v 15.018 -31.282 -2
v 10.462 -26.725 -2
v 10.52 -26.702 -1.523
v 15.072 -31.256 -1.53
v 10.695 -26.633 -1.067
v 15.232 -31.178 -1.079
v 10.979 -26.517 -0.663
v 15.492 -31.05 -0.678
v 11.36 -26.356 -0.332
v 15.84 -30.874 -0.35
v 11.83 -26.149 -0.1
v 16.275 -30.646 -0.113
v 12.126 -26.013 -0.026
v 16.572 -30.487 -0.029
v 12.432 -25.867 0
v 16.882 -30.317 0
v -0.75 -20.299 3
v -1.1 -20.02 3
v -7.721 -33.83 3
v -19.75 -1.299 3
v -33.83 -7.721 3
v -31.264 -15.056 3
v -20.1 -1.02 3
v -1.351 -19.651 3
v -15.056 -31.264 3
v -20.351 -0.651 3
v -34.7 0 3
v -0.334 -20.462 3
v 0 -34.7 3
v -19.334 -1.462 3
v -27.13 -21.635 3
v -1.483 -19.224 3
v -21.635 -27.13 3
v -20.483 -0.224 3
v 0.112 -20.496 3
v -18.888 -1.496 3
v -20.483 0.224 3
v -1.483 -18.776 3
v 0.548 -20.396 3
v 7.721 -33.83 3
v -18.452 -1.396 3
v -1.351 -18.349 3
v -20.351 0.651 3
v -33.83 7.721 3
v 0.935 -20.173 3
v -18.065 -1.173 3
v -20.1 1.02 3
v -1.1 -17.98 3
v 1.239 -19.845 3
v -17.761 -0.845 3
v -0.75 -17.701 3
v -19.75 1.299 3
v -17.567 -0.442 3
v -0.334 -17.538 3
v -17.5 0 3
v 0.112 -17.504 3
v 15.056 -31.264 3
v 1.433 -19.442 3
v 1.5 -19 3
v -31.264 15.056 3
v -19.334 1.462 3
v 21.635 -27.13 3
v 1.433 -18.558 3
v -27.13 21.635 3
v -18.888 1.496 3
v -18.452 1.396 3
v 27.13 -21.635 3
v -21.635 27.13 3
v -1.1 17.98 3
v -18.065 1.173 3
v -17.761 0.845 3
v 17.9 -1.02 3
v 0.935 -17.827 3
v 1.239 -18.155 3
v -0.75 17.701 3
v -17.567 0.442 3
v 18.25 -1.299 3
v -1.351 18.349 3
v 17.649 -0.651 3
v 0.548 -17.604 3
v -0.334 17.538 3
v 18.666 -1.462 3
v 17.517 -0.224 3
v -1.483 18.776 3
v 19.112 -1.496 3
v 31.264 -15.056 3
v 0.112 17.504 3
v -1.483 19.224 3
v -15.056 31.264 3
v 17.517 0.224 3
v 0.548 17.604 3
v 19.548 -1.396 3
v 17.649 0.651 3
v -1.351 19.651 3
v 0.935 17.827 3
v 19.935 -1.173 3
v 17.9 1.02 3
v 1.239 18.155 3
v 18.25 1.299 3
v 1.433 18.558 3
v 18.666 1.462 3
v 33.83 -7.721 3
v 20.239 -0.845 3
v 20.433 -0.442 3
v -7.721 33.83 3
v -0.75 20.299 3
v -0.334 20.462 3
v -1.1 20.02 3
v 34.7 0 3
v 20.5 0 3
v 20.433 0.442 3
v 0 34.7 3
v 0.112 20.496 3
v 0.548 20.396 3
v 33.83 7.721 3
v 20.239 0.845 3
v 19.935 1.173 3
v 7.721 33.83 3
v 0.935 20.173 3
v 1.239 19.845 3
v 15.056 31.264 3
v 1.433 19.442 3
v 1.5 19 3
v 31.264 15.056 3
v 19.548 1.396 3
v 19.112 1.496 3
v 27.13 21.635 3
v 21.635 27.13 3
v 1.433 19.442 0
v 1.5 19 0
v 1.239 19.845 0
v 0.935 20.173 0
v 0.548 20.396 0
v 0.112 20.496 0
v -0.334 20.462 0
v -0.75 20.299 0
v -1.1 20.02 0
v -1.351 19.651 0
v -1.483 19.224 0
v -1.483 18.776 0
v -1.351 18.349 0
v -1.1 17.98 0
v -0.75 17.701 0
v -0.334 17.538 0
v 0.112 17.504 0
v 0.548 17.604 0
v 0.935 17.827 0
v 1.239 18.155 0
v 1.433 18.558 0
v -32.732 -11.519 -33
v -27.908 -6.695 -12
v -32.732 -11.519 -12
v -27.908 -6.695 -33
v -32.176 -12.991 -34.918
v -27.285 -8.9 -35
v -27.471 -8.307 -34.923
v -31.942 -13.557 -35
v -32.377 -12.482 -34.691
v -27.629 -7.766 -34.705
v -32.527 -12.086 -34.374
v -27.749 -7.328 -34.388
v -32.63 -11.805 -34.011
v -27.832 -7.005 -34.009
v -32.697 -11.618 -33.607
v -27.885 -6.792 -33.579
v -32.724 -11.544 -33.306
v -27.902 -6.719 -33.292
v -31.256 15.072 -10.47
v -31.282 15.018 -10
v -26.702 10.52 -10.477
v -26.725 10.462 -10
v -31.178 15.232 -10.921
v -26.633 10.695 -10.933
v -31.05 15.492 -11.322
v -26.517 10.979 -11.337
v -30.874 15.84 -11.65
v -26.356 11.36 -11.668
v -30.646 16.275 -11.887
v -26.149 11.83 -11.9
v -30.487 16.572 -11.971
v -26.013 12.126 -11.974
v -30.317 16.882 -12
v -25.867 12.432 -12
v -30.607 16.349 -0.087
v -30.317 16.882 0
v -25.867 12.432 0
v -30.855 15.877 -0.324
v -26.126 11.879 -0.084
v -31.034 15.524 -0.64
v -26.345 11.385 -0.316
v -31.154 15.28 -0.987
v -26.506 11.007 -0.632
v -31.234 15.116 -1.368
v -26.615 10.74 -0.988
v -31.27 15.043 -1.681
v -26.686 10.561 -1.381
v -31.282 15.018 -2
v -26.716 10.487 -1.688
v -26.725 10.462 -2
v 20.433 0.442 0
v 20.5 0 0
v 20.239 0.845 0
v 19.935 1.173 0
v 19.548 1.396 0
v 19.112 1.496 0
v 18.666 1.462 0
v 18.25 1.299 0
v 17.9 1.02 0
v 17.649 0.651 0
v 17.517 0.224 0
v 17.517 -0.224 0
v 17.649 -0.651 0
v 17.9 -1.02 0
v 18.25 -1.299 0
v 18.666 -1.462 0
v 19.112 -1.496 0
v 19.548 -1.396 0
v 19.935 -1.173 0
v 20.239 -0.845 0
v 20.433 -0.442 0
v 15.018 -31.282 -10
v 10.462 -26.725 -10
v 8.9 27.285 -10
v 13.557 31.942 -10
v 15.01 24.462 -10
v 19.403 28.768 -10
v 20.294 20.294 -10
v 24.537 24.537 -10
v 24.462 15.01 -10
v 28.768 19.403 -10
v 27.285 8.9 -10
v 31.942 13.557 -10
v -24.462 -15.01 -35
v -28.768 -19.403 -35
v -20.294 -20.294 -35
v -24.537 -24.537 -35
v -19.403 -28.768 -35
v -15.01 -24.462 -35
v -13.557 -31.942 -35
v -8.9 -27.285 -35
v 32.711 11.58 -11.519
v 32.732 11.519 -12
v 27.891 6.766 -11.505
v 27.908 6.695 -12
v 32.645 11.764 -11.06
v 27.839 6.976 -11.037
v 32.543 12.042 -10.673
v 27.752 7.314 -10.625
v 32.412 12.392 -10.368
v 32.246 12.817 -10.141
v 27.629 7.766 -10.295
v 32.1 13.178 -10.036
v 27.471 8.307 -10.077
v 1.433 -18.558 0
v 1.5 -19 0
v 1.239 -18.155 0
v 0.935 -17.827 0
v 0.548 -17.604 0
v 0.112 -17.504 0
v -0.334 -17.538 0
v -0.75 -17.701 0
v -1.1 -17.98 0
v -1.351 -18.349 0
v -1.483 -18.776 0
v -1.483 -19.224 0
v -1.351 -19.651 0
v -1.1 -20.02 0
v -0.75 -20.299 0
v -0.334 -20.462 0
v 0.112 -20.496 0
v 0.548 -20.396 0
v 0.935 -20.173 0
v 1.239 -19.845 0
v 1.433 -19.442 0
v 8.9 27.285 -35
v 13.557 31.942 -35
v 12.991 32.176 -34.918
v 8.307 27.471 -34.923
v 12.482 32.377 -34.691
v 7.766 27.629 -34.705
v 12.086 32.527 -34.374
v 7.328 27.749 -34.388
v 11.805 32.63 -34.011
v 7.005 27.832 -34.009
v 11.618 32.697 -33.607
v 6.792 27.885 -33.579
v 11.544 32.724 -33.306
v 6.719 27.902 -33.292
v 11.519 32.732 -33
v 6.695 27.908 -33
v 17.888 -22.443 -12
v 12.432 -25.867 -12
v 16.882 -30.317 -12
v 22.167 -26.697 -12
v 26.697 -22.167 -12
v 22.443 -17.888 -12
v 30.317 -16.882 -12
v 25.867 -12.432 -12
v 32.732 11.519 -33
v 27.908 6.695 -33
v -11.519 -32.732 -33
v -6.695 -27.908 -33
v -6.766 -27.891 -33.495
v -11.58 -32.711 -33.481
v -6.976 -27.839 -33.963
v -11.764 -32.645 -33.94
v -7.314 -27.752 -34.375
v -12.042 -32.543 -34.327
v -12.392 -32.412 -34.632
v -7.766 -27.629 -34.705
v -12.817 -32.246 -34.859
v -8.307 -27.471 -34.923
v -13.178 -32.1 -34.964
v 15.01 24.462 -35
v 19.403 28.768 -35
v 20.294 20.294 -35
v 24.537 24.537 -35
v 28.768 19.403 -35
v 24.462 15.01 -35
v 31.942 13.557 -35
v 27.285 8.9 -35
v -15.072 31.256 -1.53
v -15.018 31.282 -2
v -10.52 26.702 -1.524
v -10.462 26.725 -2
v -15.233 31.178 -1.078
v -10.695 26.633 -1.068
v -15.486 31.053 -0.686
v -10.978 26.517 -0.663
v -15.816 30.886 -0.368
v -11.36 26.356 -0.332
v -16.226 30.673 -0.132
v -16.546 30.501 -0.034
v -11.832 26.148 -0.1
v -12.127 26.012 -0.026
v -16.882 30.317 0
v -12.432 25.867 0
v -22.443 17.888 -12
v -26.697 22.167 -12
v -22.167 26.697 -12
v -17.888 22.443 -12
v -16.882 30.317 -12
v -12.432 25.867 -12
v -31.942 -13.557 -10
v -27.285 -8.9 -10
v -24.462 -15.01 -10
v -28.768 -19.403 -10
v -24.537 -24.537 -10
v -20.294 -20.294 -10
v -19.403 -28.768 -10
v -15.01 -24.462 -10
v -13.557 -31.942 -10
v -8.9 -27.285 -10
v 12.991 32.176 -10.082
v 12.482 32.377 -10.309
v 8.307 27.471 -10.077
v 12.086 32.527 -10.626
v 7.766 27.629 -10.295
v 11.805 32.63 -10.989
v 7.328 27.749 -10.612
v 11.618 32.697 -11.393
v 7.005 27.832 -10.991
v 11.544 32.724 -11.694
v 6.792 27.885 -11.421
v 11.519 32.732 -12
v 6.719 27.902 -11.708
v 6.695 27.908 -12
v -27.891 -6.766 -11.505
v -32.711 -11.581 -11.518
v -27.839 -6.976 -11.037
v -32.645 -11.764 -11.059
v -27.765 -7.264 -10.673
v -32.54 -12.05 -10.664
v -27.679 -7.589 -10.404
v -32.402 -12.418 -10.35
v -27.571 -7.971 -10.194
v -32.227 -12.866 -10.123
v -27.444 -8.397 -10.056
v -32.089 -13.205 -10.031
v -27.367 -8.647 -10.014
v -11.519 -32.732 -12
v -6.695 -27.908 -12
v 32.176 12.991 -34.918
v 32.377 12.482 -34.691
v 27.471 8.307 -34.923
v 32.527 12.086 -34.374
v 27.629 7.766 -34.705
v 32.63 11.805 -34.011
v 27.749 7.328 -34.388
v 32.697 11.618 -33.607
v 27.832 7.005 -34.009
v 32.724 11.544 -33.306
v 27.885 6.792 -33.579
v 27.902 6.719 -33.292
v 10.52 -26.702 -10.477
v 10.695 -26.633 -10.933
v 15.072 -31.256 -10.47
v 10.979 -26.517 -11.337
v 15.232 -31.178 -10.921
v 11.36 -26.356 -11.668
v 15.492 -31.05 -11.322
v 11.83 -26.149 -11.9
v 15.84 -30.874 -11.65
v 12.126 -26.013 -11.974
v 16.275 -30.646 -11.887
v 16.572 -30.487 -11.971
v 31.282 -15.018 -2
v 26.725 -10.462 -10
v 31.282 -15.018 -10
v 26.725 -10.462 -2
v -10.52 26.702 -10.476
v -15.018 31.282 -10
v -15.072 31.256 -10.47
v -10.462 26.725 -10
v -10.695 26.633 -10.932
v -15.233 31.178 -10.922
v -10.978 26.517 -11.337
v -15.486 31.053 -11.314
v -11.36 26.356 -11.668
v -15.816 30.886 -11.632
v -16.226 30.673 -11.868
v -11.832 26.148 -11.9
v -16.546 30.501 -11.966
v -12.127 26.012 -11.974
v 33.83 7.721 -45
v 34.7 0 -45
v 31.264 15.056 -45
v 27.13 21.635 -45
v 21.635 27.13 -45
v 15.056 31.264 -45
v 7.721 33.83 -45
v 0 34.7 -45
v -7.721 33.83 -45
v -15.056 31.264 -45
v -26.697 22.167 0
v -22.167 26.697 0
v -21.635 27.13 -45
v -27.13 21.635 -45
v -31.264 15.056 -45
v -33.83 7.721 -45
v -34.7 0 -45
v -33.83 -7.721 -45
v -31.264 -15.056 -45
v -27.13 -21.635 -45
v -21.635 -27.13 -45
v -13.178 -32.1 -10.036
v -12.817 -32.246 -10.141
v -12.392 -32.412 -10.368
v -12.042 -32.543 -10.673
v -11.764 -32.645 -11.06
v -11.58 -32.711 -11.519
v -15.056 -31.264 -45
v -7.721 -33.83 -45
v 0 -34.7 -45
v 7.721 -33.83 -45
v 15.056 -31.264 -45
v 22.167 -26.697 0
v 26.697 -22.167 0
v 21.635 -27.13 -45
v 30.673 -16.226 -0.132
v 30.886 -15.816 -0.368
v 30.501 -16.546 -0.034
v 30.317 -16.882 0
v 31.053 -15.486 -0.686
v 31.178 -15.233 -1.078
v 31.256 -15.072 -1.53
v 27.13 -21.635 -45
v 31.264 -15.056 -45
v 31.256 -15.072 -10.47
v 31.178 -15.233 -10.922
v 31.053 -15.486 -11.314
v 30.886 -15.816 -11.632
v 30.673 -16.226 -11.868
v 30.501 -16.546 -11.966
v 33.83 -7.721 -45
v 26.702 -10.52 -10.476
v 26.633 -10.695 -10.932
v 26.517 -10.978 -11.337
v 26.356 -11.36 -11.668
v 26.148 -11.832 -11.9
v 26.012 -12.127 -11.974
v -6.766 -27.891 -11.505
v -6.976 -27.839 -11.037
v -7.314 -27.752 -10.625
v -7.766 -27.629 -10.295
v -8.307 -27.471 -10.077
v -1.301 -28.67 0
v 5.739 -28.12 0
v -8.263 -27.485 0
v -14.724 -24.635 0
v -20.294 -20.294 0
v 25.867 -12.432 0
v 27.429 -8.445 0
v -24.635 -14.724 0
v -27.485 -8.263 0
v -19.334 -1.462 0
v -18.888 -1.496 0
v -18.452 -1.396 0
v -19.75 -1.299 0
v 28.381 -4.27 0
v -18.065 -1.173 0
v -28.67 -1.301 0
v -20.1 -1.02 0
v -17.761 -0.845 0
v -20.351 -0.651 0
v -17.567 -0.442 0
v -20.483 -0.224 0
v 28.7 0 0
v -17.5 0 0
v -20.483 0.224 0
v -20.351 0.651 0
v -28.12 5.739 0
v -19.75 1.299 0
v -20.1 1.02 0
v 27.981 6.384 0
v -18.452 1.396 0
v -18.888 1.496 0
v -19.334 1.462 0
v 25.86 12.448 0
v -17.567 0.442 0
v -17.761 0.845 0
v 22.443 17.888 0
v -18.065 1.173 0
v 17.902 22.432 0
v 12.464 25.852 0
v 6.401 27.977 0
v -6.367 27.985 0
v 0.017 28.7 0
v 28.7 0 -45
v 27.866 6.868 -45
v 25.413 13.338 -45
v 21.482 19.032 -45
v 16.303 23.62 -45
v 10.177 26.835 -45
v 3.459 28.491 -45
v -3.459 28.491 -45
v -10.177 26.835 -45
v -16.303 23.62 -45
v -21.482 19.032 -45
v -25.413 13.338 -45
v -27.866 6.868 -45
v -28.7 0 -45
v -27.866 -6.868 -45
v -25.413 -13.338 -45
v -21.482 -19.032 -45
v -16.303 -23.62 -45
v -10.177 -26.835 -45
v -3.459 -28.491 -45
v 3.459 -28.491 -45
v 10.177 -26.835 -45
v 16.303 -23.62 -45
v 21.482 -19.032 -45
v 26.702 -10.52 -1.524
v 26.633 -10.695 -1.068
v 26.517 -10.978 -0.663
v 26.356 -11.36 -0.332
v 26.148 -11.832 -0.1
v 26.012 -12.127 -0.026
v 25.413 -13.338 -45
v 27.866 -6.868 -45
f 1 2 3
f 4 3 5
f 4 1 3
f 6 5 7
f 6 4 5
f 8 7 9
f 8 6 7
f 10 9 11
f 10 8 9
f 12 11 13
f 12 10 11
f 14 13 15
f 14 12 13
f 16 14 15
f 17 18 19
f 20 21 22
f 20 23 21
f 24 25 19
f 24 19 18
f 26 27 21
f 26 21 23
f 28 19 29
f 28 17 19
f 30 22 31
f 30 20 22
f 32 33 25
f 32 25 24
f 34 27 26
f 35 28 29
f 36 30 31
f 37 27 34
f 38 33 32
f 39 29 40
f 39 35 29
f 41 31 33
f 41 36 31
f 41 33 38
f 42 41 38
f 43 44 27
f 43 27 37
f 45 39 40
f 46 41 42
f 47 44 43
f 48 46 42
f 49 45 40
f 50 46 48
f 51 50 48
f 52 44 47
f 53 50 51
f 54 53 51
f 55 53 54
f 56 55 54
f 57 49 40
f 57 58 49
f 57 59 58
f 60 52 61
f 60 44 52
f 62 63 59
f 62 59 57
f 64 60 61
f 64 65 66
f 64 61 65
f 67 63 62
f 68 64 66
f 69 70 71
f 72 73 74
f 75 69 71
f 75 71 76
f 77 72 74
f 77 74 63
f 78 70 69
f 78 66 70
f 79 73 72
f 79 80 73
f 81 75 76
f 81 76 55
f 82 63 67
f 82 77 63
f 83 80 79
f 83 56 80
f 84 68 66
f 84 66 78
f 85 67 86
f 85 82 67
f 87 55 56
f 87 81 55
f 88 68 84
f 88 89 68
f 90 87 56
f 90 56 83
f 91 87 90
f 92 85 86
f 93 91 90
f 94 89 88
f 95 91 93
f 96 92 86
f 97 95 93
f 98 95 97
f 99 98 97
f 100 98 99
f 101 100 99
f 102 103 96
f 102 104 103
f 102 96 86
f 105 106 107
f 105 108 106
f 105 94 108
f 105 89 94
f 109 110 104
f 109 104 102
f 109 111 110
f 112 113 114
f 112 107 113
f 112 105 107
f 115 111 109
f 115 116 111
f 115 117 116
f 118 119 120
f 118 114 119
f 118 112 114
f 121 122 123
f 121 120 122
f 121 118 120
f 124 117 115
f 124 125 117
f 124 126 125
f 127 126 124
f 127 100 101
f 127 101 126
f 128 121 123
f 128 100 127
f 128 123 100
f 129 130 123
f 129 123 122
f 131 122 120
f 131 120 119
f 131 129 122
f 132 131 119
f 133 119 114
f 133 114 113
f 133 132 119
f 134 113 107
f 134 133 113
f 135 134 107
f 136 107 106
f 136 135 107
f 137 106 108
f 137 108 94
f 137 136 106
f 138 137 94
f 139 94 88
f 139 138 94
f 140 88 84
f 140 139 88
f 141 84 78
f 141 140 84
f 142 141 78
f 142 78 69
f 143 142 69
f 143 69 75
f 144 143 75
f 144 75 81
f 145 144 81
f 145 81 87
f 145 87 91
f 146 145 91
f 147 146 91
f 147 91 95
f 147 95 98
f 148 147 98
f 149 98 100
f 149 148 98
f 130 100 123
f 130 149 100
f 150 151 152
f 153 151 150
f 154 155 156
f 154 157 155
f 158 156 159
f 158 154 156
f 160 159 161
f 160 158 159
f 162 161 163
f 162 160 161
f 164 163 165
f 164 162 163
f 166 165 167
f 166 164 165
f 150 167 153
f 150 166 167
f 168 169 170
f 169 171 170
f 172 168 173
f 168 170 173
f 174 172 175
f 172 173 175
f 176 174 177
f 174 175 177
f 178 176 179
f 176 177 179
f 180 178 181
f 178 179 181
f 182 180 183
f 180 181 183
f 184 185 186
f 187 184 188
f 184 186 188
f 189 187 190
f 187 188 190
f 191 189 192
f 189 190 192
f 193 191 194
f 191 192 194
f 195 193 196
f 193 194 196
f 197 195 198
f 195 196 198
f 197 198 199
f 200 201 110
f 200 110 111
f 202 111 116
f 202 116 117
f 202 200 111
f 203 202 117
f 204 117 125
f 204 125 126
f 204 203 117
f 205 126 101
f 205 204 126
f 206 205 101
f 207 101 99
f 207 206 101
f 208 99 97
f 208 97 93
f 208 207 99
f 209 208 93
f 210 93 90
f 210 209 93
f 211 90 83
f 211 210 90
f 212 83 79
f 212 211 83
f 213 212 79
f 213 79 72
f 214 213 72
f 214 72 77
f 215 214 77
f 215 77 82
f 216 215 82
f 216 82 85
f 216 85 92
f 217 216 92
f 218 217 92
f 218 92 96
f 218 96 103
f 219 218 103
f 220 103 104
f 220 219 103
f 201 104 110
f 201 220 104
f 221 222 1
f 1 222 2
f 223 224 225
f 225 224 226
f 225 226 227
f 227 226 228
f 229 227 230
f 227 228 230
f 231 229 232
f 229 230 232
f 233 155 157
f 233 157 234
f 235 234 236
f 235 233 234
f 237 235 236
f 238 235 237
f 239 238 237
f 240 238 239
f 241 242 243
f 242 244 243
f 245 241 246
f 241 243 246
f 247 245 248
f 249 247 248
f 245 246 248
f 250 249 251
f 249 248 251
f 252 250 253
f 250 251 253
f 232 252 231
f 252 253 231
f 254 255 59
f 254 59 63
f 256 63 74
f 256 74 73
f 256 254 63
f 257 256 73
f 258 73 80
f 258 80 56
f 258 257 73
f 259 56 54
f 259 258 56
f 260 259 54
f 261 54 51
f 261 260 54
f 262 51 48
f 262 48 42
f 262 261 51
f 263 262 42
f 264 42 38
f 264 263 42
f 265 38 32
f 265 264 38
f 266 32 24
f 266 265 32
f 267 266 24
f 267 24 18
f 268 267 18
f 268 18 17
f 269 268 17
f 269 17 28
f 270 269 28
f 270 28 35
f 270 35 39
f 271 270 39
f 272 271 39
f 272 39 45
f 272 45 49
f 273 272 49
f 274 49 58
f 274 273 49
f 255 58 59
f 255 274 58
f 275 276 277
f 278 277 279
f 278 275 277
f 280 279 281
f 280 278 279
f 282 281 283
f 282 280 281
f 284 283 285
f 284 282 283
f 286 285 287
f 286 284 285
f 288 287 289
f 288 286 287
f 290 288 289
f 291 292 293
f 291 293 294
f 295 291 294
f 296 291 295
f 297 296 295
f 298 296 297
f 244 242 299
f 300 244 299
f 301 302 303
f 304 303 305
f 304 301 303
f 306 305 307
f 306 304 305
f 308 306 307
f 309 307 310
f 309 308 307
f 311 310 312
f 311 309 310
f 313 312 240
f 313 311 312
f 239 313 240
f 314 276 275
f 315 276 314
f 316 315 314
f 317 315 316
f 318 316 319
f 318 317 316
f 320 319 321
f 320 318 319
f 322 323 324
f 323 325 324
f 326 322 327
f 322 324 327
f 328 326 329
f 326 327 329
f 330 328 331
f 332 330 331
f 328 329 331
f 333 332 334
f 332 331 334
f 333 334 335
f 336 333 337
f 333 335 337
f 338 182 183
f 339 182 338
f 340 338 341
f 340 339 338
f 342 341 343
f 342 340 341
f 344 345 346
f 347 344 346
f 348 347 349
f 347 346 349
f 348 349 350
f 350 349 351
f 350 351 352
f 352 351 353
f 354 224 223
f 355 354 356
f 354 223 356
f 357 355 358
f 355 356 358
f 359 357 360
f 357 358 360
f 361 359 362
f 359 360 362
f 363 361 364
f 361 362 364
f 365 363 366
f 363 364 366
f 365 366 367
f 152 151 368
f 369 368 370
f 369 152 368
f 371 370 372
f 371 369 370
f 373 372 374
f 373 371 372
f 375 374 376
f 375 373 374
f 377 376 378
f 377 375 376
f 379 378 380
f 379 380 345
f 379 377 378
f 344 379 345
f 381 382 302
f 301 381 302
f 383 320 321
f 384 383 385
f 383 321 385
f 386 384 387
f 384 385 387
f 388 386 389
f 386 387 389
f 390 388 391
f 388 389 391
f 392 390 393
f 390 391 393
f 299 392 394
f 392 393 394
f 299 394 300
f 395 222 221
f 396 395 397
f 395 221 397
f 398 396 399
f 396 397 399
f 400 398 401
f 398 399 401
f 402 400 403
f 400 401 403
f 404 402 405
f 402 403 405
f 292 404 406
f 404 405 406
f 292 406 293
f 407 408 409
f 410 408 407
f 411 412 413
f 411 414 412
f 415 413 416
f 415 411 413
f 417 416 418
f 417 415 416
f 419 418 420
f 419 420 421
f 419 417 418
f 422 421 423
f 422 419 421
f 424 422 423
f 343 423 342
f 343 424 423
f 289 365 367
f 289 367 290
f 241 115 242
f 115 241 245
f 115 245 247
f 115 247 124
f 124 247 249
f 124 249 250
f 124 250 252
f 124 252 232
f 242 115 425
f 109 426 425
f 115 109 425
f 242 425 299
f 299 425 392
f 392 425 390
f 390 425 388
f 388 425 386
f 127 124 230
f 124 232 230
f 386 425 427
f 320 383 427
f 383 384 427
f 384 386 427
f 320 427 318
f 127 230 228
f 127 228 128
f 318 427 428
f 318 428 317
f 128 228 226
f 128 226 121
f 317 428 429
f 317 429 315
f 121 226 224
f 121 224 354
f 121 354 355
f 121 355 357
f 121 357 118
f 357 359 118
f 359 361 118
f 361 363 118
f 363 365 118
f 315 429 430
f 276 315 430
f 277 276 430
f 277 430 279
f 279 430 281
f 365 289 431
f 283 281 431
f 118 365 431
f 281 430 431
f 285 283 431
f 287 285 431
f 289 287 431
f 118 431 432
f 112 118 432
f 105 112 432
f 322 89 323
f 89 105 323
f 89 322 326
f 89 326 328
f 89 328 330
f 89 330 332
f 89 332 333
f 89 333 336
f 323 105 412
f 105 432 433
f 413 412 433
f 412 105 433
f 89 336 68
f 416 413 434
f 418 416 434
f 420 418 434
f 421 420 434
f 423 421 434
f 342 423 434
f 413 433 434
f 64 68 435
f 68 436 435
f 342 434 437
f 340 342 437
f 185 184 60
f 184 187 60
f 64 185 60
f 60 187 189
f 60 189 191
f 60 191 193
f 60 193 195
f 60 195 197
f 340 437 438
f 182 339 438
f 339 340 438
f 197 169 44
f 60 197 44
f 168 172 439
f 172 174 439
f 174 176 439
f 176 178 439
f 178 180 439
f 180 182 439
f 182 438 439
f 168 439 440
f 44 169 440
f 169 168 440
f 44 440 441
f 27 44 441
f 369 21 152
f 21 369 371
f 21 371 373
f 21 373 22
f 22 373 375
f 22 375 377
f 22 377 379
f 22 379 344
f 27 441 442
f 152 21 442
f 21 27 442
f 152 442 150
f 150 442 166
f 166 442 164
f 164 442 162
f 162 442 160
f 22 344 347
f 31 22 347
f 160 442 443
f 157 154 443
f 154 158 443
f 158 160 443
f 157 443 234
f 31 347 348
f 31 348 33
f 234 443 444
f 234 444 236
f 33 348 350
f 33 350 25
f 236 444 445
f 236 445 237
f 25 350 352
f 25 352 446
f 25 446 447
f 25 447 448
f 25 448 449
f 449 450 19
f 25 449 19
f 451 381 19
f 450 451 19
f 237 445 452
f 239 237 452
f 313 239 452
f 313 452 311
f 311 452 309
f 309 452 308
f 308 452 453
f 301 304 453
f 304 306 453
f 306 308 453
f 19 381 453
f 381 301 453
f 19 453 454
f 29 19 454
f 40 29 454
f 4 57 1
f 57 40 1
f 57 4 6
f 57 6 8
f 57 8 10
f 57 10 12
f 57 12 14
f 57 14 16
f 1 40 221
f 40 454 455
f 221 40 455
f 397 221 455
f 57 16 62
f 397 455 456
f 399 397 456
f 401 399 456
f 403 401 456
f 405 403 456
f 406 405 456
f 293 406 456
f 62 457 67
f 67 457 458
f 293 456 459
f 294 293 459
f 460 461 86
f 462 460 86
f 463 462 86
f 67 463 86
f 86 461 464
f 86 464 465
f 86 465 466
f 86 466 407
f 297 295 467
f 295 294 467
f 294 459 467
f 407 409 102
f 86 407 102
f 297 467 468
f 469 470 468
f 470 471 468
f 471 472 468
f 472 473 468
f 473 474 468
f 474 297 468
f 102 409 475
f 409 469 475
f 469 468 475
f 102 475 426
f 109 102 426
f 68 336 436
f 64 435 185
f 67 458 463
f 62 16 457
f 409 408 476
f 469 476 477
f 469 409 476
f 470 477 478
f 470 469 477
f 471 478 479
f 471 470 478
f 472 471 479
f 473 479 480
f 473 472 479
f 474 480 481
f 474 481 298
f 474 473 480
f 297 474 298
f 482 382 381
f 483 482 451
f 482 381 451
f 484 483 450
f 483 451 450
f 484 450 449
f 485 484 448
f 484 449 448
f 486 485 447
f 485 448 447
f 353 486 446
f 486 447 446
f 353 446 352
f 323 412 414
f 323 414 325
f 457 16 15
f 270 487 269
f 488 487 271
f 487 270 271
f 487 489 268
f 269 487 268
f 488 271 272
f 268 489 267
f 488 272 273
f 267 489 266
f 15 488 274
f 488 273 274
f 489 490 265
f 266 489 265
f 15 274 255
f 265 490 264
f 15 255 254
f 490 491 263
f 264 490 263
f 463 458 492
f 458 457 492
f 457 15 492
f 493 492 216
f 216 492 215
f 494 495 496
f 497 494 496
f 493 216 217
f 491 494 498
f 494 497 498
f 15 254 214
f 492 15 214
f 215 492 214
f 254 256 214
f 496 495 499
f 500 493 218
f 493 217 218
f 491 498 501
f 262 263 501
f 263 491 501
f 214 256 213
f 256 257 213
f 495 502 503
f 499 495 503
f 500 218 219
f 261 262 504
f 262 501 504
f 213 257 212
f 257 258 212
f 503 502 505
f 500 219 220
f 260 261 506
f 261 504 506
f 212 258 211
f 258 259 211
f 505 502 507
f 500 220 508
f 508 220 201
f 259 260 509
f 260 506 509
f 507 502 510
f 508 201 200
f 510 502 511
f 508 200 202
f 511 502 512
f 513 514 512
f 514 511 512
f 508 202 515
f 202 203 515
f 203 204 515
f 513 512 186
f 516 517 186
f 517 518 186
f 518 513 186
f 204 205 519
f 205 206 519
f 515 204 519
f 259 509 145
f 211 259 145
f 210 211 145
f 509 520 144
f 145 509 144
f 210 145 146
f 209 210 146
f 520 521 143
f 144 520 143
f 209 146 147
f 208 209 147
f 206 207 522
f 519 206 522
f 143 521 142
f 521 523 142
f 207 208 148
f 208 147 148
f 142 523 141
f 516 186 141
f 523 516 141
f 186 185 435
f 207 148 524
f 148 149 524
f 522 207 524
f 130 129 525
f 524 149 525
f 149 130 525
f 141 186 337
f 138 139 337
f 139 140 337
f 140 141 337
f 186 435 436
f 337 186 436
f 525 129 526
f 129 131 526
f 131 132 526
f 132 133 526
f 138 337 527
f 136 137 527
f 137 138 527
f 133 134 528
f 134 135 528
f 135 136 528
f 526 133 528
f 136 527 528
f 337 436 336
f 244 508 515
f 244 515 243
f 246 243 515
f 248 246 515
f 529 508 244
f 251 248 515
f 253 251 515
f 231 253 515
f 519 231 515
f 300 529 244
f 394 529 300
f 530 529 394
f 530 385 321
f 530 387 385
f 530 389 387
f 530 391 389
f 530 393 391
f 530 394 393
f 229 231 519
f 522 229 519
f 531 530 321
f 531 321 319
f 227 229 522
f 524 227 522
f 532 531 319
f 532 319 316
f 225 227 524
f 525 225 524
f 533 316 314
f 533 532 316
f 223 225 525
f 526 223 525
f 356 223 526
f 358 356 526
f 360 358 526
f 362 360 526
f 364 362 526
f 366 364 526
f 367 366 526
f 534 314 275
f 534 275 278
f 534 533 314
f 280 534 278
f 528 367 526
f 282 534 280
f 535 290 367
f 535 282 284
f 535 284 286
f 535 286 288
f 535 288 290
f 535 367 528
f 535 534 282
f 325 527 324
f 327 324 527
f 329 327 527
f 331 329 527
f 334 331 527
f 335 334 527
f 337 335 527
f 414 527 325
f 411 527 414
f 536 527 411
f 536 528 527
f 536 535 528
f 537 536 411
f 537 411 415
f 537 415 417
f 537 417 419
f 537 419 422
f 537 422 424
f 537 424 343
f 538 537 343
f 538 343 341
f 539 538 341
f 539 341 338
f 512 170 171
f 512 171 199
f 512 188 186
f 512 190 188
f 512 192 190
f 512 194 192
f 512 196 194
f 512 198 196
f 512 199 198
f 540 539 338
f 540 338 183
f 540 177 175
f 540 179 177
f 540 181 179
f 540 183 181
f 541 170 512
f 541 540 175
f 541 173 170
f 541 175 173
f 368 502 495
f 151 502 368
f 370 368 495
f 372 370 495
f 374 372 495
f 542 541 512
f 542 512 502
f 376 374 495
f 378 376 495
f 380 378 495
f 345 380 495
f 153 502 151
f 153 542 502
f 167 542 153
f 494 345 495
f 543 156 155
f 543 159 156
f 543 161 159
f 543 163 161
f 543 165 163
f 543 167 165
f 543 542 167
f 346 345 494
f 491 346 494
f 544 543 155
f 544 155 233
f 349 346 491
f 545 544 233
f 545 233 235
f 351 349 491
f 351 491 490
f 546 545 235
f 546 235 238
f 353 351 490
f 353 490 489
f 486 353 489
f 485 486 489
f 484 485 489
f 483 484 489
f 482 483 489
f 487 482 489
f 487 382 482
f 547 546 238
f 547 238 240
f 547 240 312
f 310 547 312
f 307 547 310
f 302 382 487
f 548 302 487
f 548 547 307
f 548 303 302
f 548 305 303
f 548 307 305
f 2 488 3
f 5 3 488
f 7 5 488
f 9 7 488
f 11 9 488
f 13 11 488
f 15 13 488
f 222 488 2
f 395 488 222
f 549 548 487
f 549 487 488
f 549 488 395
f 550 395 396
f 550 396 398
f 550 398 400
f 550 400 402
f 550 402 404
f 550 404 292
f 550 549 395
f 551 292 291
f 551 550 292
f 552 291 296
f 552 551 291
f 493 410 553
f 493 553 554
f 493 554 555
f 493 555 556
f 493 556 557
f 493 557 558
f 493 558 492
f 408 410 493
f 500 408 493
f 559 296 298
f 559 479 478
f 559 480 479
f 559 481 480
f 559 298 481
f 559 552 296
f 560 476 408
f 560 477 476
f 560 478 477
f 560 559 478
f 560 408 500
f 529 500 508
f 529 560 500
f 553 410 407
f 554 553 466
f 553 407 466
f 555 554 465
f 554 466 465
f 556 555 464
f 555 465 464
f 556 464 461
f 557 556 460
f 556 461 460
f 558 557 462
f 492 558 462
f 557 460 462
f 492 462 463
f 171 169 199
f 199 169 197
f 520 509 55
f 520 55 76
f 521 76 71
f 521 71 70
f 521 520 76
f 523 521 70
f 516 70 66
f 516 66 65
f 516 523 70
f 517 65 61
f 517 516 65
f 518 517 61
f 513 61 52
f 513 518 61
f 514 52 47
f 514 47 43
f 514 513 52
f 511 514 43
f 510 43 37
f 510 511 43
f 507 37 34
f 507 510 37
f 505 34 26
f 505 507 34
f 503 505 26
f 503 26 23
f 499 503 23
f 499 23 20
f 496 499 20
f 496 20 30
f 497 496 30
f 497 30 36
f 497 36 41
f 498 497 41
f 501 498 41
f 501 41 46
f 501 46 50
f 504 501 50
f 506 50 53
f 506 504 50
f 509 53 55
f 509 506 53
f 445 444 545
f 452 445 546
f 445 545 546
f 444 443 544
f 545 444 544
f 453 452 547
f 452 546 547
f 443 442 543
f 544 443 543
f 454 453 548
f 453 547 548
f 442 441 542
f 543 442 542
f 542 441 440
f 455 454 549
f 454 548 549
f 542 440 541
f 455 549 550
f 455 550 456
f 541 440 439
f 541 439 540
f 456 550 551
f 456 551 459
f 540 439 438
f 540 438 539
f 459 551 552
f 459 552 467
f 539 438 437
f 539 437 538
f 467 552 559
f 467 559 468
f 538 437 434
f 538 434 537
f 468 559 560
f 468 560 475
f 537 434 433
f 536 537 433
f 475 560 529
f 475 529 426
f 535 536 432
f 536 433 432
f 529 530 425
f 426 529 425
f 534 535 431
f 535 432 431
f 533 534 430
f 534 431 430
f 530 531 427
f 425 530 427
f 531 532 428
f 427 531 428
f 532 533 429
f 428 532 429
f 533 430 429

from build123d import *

# Parameters (mm, degrees)
SKETCH_1_R          = 28.7
SKETCH_1_R_2        = 1.5
EXTRUDE_1_DEPTH     = 3
EXTRUDE_START       = -48
SKETCH_2_R          = 34.7
SKETCH_2_R_2        = 28.7
EXTRUDE_2_DEPTH     = 48
SKETCH_3_W          = 12
SKETCH_3_H          = 23
CUT_EXTRUDE_1_DEPTH = 96.09443105
FILLET_1_R          = 2
SKETCH_4_W          = 30
SKETCH_4_H          = 25
CUT_EXTRUDE_2_DEPTH = 96.094431221
FILLET_2_R          = 2


with BuildPart() as part:
    # 草图1 → 凸台-拉伸1 (new body)
    with BuildSketch(Plane.XY):
        Circle(SKETCH_1_R)
        with Locations((0, 19)):
            Circle(SKETCH_1_R_2, mode=Mode.SUBTRACT)
        with Locations((19, 0)):
            Circle(SKETCH_1_R_2, mode=Mode.SUBTRACT)
        with Locations((0, -19)):
            Circle(SKETCH_1_R_2, mode=Mode.SUBTRACT)
        with Locations((-19, 0)):
            Circle(SKETCH_1_R_2, mode=Mode.SUBTRACT)
    extrude(amount=EXTRUDE_1_DEPTH)

    # 草图2 → 凸台-拉伸2 (add)
    with BuildSketch(Plane.XY.offset(3).offset(EXTRUDE_START)):
        Circle(SKETCH_2_R)
        Circle(SKETCH_2_R_2, mode=Mode.SUBTRACT)
    extrude(amount=EXTRUDE_2_DEPTH)

    # 草图3 → 切除-拉伸1 (cut, through all)
    with BuildSketch(Plane(origin=(-24.536605307, 24.536605307, 0), x_dir=(0, 0, 1), z_dir=(-0.7071067811865488, 0.7071067811865464, 0))):
        with Locations((-6, 0)):
            Rectangle(SKETCH_3_W, SKETCH_3_H)
    extrude(amount=-CUT_EXTRUDE_1_DEPTH, mode=Mode.SUBTRACT)

    # 圆角1
    fillet_1_edges = [part.edges().sort_by_distance(p)[0] for p in [
        (29.00347462, -12.740018652, -12),
        (-12.740018652, 29.00347462, -12),
        (29.00347462, -12.740018652, 0),
        (-12.740018652, 29.00347462, 0),
        (12.740018652, -29.00347462, 0),
        (-29.00347462, 12.740018652, 0),
        (-29.00347462, 12.740018652, -12),
        (12.740018652, -29.00347462, -12),
    ]]
    fillet(fillet_1_edges, radius=FILLET_1_R)

    # 草图4 → 切除-拉伸2 (cut, through all)
    with BuildSketch(Plane(origin=(24.536605307, 24.536605307, 0), x_dir=(0.7071067811865487, -0.7071067811865465, 0), z_dir=(0.7071067811865465, 0.7071067811865487, 0))):
        with Locations((0, 22.5)):
            Rectangle(SKETCH_4_W, SKETCH_4_H)
    extrude(amount=-CUT_EXTRUDE_2_DEPTH, mode=Mode.SUBTRACT)

    # 圆角2
    fillet_2_edges = [part.edges().sort_by_distance(p)[0] for p in [
        (-9.107024959, -30.320228395, -35),
        (30.320228395, 9.107024959, -35),
        (-9.107024959, -30.320228395, -10),
        (30.320228395, 9.107024959, -10),
        (-30.320228395, -9.107024959, -10),
        (9.107024959, 30.320228395, -10),
        (-30.320228395, -9.107024959, -35),
        (9.107024959, 30.320228395, -35),
    ]]
    fillet(fillet_2_edges, radius=FILLET_2_R)


solid = part.part
